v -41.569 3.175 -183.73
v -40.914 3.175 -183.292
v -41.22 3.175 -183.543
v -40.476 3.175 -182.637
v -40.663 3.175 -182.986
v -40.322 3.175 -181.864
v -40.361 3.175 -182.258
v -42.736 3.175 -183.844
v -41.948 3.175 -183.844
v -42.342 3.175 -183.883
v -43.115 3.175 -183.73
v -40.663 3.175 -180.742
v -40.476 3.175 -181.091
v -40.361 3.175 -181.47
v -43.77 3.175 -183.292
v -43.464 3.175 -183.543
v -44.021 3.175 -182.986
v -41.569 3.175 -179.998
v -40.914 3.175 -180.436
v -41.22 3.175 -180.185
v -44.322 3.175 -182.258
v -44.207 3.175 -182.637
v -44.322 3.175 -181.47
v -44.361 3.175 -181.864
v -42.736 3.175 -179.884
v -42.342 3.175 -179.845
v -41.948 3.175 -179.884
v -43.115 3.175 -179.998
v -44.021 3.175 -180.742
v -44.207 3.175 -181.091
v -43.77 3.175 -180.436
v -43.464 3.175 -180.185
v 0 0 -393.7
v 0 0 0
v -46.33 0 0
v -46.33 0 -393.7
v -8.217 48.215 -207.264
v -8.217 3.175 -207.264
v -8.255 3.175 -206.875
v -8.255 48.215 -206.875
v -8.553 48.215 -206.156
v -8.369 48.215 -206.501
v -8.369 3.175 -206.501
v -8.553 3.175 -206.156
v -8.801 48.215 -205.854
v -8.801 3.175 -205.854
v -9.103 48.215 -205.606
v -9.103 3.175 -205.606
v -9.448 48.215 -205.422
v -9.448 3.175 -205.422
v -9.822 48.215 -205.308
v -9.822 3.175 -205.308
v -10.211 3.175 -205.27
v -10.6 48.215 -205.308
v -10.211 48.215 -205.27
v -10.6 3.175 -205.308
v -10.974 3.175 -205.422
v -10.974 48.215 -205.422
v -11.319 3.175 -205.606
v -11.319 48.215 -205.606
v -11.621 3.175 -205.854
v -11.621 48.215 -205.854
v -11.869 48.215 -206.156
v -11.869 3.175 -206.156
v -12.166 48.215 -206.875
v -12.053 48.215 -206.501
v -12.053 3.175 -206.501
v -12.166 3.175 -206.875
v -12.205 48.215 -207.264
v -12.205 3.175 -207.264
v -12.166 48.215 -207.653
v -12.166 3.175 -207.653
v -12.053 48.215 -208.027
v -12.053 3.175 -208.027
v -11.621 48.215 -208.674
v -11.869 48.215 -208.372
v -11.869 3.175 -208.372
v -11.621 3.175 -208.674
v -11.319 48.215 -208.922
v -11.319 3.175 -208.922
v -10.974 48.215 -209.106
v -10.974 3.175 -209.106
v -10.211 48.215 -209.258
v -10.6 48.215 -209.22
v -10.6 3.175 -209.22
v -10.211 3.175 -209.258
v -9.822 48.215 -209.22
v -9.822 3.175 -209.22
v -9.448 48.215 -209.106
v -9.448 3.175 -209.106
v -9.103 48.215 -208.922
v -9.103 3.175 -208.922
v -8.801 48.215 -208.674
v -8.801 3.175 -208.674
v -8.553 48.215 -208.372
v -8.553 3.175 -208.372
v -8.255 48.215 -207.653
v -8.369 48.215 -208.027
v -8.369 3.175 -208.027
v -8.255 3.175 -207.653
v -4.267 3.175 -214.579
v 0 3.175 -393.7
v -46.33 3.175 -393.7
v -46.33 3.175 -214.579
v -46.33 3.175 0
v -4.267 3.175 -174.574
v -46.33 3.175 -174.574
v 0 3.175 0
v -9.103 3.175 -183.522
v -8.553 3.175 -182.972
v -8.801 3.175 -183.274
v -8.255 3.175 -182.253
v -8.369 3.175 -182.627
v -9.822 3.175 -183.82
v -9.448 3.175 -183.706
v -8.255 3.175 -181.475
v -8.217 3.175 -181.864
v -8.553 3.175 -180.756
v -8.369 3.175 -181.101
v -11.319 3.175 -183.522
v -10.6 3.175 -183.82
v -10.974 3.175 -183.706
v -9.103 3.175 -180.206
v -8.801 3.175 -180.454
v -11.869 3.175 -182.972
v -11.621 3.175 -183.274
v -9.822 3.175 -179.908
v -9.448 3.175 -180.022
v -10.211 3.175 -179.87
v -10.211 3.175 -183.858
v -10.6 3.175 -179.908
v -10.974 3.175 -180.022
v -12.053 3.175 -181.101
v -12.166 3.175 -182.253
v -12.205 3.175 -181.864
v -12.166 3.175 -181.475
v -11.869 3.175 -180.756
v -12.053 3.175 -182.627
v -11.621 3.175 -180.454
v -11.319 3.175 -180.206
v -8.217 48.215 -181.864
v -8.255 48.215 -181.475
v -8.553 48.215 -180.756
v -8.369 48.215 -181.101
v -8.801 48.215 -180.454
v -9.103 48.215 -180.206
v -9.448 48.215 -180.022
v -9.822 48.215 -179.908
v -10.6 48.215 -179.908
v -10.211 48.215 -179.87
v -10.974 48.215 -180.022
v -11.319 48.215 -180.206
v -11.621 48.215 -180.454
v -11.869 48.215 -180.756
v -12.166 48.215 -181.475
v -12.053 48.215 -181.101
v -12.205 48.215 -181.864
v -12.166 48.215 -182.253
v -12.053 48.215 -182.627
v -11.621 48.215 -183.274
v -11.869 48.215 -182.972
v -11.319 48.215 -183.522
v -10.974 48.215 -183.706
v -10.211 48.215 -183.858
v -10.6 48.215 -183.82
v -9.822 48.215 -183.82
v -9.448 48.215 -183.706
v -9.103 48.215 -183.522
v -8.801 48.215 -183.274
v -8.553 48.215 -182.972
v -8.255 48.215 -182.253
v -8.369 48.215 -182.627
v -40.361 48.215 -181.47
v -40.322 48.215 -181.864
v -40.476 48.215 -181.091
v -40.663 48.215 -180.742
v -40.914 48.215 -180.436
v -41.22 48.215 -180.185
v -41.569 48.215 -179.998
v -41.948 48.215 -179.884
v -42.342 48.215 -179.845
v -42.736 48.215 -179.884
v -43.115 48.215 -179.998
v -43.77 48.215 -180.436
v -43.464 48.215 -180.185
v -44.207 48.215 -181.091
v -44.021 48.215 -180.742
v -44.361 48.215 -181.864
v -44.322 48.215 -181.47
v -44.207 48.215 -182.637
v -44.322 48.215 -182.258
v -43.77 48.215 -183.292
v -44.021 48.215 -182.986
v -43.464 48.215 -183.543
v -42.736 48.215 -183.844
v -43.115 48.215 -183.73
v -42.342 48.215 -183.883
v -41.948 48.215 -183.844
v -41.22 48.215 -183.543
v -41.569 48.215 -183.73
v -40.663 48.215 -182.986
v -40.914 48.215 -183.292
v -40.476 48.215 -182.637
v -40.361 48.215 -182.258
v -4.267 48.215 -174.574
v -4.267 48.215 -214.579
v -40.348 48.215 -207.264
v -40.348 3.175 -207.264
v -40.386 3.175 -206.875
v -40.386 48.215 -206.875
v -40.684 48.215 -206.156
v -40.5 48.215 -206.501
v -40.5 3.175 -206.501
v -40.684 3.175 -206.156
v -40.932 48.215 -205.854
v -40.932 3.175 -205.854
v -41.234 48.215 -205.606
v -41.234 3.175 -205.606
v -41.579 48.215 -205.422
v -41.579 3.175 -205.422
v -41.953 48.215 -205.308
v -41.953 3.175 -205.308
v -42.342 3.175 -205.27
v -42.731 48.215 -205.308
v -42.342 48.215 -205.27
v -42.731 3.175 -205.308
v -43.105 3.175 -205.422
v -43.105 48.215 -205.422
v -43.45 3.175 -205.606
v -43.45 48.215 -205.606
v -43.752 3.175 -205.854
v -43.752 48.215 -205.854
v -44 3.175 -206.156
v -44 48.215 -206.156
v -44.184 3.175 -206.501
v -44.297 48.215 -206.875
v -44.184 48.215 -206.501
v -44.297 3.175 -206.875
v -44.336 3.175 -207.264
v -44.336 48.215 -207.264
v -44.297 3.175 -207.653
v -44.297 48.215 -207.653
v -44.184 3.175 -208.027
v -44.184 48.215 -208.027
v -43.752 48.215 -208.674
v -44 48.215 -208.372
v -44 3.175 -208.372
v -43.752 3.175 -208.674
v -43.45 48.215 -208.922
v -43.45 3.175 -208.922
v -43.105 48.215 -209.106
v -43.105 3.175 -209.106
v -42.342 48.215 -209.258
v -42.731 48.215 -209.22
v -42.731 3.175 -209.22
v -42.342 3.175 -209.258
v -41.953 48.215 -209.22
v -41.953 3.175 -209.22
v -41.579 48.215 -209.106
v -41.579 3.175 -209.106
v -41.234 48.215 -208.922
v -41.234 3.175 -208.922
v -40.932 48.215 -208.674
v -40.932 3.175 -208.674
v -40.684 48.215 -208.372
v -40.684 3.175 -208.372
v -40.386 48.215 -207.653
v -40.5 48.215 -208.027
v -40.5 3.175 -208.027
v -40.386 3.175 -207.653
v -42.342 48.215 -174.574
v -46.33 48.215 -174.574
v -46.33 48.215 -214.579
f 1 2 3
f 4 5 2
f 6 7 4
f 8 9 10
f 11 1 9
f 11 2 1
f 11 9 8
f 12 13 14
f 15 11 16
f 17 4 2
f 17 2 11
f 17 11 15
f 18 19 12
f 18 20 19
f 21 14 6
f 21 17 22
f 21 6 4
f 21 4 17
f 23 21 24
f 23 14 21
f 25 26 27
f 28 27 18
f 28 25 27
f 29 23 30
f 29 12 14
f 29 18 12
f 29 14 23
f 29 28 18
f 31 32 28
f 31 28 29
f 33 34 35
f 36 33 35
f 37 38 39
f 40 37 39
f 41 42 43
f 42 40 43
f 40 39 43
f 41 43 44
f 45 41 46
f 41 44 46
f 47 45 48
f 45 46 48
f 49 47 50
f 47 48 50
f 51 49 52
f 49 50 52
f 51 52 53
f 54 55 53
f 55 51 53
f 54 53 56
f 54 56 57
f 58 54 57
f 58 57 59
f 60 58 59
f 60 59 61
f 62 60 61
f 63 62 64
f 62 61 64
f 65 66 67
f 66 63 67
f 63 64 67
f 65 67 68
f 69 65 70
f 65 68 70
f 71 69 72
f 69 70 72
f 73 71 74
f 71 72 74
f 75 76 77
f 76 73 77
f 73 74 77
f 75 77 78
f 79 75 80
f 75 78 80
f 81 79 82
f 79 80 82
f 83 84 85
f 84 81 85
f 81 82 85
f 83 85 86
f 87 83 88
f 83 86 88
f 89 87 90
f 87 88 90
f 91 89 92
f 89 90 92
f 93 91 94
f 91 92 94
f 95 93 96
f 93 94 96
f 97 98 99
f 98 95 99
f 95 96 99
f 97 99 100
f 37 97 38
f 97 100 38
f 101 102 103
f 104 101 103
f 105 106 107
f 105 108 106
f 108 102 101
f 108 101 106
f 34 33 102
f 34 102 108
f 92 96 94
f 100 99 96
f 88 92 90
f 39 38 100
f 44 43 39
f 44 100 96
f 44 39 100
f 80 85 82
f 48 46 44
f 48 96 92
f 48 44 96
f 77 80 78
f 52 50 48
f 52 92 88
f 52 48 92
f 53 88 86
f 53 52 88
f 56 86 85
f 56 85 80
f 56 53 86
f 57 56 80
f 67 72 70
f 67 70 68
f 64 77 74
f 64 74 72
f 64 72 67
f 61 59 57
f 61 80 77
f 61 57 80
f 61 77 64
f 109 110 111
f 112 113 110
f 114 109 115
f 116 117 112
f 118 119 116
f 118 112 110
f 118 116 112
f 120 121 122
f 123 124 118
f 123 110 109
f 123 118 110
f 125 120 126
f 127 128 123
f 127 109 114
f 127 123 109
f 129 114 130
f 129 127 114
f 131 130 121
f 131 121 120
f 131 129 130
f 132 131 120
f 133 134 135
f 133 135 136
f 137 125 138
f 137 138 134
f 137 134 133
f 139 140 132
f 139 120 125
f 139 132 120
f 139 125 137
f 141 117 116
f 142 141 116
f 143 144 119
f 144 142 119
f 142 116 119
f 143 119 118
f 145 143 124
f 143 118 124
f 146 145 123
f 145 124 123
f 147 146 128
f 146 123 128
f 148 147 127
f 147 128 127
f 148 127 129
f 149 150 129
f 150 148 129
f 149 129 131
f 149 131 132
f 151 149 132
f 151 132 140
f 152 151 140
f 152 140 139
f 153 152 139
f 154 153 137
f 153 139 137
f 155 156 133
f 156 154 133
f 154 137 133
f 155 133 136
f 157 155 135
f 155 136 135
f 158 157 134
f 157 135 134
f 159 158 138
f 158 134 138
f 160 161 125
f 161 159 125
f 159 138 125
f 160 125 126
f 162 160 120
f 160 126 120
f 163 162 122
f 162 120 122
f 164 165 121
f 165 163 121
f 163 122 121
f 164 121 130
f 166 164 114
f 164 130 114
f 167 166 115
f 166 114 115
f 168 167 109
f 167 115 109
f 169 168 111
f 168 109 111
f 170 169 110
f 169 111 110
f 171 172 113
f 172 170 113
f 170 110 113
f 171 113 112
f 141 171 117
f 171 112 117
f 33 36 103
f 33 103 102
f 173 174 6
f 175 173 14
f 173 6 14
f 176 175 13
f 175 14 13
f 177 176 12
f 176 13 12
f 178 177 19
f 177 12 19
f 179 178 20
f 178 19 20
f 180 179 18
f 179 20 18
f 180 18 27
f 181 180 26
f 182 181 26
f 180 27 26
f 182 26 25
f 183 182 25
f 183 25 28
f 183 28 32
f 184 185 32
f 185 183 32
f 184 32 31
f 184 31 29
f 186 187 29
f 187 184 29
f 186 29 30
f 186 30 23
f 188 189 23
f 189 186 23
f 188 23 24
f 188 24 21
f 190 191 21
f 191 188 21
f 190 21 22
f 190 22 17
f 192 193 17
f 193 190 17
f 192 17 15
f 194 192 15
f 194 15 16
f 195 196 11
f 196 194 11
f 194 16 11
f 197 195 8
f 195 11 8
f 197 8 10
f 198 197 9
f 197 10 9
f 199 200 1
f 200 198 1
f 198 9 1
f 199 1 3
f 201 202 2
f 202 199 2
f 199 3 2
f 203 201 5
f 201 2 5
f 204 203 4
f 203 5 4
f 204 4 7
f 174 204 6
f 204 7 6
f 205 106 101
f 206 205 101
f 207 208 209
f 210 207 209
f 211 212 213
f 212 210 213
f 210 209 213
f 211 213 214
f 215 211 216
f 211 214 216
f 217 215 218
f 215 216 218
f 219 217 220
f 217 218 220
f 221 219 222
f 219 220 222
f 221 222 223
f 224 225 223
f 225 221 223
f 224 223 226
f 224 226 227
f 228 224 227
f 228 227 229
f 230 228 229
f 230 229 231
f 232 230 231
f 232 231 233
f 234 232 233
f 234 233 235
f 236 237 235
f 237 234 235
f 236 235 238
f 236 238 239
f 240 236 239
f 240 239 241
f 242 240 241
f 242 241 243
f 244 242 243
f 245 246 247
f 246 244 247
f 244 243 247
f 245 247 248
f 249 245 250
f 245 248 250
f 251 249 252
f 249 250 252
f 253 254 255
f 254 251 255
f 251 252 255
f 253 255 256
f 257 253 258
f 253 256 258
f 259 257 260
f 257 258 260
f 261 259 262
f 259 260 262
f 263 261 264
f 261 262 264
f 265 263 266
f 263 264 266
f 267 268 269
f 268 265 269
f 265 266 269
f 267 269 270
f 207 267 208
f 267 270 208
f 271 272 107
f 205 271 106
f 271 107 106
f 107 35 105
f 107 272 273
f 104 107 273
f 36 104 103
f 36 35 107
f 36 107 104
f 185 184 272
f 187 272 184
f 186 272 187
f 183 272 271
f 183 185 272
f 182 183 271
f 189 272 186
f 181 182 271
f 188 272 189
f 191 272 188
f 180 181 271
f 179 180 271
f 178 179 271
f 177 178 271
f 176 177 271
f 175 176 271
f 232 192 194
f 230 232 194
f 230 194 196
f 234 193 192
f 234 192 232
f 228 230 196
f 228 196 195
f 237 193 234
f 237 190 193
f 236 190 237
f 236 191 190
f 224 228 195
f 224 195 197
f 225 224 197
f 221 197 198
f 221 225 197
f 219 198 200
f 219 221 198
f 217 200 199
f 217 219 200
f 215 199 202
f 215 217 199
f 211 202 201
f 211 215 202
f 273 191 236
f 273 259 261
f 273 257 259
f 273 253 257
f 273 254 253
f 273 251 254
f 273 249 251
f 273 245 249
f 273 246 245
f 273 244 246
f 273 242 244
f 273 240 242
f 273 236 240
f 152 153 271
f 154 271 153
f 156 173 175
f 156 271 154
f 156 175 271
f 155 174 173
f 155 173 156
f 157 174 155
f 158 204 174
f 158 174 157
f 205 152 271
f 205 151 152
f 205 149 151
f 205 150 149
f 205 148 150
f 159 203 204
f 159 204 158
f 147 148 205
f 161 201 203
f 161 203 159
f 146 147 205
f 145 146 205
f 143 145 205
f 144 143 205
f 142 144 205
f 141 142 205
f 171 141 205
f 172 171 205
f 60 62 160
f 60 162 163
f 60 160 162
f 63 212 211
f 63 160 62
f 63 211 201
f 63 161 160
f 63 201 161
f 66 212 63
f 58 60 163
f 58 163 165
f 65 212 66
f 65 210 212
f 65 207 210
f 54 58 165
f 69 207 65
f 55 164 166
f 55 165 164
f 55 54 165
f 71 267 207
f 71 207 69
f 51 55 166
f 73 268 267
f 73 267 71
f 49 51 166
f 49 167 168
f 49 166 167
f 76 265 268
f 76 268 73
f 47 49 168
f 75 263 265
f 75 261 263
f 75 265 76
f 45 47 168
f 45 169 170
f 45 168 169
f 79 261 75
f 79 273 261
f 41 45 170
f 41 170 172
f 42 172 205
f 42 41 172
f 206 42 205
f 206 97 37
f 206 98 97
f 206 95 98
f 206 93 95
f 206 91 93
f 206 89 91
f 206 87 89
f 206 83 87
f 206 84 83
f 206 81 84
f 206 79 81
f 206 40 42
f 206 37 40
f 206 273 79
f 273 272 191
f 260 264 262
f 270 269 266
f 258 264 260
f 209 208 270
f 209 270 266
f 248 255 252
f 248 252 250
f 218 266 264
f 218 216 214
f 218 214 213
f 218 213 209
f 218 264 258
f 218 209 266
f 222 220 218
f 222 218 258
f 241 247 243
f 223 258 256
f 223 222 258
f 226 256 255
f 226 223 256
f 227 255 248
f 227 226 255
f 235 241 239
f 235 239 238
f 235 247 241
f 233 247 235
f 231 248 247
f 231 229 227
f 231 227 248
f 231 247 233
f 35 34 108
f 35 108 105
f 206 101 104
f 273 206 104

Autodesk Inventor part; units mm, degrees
ref_plane "YZ Plane" through (0, 0, 0) normal (1, 0, 0) x (0, 1, 0)
ref_plane "XZ Plane" through (0, 0, 0) normal (0, 1, 0) x (-1, 0, 0)
ref_plane "XY Plane" through (0, 0, 0) normal (0, 0, 1) x (1, 0, 0)
sketch "Sketch1" plane through (0, 0, 0) normal (0, 1, 0) x (-1, 0, 0)
  line L0 (0, 0) -> (46.3296, 0)
  line L1 (46.3296, 0) -> (46.3296, -393.7)
  line L2 (46.3296, -393.7) -> (0, -393.7)
  line L3 (0, -393.7) -> (0, 0)
  dimension "d0" = 46.3296
  dimension "d1" = 393.7
extrude "Extrusion1" add sketch "Sketch1" along normal blind 3.175
sketch "Sketch2" plane through (0, 3.175, 0) normal (0, 1, 0) x (1, 0, 0)
  circle A0 centre (-42.3418, 181.864) radius 2.0193
  line L0 (-46.3296, 0) -> (-46.3296, 393.7) projected
  line L1 (-46.3296, 0) -> (0, 0) projected
  circle A1 centre (-42.3418, 207.264) radius 1.9939
  circle A2 centre (-10.2108, 181.864) radius 1.9939
  circle A3 centre (-10.2108, 207.264) radius 1.9939
  line L2 (-46.3296, 393.7) -> (-46.3296, 0) projected
  line L3 (-42.3418, 181.864) -> (-42.3418, 174.5742)
  line L4 (-46.3296, 174.5742) -> (-4.2672, 174.5742)
  line L5 (-4.2672, 174.5742) -> (-4.2672, 214.5792)
  line L6 (-4.2672, 214.5792) -> (-46.3296, 214.5792)
  line L7 (-46.3296, 174.5742) -> (-46.3296, 214.5792)
  dimension "d4" = 4.0386
  dimension "d5" = 3.9878
  dimension "d6" = 181.864
  dimension "d8" = 3.9878
  dimension "d10" = 3.9878
  dimension "d12" = 3.9878
  dimension "d14" = 7.2898
  dimension "d15" = 42.0624
  dimension "d16" = 40.005
extrude "Extrusion2" add sketch "Sketch2" along normal blind 45.04
properties part number "claw mount" material "Aluminum 6061"
